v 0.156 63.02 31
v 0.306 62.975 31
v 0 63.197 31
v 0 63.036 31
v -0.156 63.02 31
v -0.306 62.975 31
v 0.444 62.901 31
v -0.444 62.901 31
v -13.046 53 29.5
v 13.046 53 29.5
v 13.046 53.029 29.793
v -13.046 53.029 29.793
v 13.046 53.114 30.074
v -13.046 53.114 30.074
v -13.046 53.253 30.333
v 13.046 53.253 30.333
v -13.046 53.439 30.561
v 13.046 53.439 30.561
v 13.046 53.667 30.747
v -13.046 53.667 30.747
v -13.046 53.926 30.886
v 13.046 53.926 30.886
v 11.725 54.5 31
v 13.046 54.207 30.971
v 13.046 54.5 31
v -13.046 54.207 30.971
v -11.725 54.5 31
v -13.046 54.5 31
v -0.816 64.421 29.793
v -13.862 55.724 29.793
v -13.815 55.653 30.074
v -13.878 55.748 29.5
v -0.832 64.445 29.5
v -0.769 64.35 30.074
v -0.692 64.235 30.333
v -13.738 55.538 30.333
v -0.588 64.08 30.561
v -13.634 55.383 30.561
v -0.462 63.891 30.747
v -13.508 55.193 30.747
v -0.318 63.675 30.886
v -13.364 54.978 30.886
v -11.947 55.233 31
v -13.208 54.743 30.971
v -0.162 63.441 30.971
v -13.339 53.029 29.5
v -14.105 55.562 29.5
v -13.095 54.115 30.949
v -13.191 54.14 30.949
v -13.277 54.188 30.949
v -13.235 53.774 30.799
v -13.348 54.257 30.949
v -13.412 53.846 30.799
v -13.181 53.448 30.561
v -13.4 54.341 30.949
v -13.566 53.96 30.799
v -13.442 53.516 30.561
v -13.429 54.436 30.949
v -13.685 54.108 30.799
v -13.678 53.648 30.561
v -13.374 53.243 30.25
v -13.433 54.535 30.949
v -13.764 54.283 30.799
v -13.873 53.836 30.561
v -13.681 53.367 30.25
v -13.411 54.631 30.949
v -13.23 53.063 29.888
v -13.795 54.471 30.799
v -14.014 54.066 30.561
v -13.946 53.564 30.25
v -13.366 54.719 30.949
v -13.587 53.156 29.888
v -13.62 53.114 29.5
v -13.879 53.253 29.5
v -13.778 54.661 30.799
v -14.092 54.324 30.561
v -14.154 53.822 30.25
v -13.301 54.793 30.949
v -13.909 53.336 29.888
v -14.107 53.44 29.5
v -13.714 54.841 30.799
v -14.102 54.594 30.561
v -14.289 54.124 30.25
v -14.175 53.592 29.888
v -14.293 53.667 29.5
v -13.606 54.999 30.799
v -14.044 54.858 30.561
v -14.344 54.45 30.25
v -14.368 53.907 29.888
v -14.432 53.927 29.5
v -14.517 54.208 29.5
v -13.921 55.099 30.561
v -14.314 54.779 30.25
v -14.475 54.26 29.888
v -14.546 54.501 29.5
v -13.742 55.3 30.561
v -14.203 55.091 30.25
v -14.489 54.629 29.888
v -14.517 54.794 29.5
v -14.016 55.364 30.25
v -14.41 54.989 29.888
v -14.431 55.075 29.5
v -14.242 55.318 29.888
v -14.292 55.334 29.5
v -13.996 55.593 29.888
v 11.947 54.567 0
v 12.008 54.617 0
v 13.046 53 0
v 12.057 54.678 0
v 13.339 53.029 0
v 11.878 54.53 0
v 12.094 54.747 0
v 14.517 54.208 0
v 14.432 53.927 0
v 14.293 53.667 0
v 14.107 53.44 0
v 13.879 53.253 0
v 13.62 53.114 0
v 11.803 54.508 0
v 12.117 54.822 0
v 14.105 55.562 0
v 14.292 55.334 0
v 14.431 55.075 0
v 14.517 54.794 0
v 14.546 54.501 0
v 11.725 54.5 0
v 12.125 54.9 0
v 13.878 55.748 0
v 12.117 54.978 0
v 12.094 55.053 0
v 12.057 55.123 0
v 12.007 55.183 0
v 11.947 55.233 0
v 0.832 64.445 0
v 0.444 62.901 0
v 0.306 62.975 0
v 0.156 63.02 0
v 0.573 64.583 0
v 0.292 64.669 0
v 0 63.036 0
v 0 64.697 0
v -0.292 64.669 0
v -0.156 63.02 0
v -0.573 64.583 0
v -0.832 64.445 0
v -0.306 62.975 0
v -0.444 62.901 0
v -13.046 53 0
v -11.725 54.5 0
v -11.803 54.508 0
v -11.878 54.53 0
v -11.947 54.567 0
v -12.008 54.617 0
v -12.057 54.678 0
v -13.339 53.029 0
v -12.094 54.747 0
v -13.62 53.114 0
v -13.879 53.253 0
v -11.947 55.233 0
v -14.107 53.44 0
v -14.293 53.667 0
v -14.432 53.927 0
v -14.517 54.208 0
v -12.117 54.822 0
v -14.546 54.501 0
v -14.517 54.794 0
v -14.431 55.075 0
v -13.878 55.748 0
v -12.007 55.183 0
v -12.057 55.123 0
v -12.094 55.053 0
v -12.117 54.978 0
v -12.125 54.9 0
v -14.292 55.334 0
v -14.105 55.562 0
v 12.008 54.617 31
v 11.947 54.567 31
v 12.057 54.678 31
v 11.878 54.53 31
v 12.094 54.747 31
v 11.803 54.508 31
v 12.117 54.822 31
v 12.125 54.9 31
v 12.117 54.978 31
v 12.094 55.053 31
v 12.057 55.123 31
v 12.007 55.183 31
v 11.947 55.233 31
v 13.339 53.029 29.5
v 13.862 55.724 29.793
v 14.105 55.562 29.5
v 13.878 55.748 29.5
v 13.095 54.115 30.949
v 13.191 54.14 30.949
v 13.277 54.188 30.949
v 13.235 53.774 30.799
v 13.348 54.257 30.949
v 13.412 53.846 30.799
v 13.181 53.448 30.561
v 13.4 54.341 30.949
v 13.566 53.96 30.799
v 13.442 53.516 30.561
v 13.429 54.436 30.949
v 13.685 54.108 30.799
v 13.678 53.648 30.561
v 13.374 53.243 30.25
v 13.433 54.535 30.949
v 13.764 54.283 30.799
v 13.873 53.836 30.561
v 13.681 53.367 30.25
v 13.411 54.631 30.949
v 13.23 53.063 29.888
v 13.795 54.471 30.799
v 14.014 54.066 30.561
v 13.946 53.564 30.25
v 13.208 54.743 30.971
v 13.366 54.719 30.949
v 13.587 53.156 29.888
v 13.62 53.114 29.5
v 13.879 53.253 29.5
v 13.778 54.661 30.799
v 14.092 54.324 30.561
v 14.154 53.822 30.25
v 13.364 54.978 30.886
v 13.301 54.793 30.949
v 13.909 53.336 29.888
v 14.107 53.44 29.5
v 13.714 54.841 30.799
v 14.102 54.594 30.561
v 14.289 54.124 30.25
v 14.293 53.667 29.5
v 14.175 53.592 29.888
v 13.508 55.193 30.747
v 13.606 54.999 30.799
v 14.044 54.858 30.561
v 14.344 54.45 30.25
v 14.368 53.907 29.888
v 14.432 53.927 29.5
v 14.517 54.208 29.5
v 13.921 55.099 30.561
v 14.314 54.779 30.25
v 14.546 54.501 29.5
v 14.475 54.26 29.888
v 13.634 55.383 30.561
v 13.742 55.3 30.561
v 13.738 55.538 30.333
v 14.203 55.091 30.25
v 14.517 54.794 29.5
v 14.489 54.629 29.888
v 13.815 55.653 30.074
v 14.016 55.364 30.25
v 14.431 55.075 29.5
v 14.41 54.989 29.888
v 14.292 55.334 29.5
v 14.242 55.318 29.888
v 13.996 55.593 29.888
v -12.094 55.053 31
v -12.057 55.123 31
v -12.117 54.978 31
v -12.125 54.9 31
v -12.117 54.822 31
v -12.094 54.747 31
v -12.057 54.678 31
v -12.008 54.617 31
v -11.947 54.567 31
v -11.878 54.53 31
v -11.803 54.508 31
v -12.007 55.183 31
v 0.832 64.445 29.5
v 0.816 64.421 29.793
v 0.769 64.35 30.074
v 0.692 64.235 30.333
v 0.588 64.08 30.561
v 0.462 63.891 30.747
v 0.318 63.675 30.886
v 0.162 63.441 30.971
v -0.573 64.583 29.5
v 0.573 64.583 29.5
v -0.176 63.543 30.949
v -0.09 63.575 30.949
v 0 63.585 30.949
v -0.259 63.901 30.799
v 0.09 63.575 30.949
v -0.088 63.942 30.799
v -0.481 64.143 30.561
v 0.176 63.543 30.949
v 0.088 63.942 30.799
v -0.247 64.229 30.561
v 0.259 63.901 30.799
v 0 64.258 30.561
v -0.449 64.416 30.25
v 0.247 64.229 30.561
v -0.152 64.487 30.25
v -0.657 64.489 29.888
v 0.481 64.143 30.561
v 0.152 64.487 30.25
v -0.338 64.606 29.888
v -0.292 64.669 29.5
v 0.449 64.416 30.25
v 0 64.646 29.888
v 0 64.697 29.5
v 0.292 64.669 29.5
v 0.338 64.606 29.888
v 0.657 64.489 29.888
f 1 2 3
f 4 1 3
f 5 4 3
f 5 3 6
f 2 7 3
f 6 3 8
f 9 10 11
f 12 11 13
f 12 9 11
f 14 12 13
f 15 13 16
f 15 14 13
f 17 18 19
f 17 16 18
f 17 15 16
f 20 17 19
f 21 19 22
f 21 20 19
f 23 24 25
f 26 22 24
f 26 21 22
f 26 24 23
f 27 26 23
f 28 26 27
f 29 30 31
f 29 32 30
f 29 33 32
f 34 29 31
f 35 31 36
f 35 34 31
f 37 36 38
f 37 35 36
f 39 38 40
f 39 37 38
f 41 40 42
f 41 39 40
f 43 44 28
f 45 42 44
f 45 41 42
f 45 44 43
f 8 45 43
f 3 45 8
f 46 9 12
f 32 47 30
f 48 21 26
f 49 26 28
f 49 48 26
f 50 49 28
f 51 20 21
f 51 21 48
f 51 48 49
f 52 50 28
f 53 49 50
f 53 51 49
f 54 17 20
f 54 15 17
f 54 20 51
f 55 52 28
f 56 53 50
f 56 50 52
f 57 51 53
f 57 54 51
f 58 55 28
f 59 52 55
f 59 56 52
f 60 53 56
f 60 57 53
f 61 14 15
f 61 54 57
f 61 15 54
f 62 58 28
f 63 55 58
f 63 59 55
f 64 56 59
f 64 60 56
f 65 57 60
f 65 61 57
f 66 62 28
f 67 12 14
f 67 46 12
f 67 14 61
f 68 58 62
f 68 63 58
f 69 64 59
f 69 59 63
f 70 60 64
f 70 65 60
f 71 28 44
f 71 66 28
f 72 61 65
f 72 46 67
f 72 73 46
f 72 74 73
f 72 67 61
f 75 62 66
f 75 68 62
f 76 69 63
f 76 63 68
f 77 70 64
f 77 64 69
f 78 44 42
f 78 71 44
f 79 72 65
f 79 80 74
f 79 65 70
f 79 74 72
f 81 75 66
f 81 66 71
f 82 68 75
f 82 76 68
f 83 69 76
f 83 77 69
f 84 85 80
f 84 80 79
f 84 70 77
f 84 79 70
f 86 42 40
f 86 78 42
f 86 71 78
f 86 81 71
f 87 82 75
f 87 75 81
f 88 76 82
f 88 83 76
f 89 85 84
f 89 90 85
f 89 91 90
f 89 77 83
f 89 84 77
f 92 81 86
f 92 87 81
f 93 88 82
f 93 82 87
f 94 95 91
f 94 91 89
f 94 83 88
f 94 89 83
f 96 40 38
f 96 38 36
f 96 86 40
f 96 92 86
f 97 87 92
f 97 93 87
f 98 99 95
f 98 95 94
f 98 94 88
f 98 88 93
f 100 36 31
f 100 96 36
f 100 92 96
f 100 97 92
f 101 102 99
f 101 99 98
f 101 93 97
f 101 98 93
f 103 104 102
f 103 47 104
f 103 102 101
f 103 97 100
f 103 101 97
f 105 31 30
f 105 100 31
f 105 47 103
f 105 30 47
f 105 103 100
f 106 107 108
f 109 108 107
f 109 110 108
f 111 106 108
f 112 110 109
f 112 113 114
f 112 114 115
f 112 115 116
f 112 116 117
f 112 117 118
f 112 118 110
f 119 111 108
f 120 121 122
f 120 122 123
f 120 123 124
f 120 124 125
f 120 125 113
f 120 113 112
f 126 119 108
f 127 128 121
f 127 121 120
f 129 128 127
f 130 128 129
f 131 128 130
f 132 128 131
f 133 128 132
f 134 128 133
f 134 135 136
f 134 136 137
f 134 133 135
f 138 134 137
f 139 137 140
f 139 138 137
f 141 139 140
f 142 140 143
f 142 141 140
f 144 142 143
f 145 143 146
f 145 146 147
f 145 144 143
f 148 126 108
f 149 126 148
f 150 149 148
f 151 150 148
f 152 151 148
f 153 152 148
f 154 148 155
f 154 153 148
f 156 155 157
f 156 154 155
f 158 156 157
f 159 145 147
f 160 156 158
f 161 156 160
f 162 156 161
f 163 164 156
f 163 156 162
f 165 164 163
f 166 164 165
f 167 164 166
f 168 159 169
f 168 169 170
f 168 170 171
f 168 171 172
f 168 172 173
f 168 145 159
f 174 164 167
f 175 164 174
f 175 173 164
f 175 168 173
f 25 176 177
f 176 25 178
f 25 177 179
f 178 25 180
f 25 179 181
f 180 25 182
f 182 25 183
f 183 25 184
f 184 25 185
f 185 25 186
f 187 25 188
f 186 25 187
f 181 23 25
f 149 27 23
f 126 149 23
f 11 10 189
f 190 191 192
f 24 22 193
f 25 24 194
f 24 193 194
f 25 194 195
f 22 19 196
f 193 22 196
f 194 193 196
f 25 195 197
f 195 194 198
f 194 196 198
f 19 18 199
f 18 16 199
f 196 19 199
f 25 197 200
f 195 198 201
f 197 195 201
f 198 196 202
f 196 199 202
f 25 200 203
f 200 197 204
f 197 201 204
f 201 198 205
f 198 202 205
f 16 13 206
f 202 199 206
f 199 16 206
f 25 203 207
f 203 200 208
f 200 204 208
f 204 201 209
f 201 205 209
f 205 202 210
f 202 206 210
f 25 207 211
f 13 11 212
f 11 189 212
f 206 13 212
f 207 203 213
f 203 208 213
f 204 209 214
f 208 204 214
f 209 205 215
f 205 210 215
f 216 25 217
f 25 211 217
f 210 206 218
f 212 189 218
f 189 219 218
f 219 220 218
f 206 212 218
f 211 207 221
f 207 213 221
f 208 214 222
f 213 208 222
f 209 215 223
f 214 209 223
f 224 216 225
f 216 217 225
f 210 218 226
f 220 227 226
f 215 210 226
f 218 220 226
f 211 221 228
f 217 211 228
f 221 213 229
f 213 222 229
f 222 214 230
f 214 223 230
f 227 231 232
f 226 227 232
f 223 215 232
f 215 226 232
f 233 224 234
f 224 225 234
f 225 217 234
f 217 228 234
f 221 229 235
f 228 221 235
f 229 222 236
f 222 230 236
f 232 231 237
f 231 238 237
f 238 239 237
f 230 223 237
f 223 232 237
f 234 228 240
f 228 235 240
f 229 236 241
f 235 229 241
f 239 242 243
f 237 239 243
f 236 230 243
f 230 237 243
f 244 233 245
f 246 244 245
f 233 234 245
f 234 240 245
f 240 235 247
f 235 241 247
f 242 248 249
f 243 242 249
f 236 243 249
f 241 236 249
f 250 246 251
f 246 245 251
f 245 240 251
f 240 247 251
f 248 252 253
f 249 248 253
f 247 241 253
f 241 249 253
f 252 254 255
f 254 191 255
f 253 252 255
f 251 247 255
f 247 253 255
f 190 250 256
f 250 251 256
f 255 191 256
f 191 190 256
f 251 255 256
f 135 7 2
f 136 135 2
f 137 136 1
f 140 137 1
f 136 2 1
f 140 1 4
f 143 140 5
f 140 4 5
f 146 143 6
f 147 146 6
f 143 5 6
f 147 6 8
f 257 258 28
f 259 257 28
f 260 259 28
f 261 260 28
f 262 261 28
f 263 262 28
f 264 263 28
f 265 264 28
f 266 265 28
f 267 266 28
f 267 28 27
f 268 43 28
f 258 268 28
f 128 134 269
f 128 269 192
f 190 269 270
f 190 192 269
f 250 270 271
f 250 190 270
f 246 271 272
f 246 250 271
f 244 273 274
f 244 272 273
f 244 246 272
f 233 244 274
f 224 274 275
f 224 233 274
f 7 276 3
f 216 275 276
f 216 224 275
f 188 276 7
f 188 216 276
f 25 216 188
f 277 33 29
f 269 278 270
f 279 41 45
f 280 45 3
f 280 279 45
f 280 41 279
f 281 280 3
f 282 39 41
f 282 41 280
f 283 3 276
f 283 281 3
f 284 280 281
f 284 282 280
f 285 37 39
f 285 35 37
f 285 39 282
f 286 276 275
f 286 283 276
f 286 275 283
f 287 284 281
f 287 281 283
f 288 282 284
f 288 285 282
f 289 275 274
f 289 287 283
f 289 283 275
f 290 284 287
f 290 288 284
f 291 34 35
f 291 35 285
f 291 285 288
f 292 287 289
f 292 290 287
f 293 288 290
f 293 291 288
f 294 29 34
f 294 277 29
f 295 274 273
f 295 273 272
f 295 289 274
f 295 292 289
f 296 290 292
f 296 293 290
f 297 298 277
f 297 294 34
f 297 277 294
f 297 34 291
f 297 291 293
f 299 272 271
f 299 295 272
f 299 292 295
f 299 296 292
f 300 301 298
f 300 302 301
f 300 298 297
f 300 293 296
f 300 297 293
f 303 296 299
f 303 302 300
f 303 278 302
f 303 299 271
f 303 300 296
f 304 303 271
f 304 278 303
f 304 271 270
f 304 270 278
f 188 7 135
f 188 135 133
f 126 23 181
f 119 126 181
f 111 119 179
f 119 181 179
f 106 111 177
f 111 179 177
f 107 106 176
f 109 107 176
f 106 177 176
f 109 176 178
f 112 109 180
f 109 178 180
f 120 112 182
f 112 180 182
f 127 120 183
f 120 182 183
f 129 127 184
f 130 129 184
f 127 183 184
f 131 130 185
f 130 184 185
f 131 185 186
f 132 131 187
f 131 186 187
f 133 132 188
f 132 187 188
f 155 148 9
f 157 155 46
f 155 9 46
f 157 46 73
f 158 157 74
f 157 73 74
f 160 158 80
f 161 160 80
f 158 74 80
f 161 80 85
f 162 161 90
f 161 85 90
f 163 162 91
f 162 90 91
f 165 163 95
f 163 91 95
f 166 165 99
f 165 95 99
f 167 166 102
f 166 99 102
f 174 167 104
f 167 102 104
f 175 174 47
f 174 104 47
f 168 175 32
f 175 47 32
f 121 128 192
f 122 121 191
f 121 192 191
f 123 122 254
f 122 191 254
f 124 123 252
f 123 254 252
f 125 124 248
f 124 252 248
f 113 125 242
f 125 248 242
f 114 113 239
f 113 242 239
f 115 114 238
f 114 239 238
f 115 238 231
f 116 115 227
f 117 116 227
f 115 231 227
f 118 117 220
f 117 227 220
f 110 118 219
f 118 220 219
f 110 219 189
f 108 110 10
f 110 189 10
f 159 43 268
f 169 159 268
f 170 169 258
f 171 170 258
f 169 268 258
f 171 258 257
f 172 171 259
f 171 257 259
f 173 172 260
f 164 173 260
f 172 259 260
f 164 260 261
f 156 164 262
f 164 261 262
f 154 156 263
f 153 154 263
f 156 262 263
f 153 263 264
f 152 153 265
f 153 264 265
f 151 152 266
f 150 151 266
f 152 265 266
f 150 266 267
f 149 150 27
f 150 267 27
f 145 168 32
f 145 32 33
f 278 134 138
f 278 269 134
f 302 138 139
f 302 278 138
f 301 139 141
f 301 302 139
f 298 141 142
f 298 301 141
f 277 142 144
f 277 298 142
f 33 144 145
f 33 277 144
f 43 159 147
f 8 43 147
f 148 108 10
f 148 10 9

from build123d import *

# Parameters (mm, degrees)
PAD010_DEPTH = 31
FILLET004_R  = 1.5
POCKET_DEPTH = 32


with BuildPart() as part:
    # Sketch002 → Pad010 (new body)
    with BuildSketch(Plane.XY):
        Polygon((0, 65), (18, 53), (-18, 53), align=None)
    extrude(amount=PAD010_DEPTH)

    # Fillet004
    fillet004_edges = [part.edges().sort_by_distance(p)[0] for p in [
        (-18, 53, 15.5),
        (18, 53, 15.5),
        (0, 65, 15.5),
        (0, 53, 31),
        (-9, 59, 31),
        (9, 59, 31),
    ]]
    fillet(fillet004_edges, radius=FILLET004_R)

    # Sketch004 (on Face11 of Fillet004) → Pocket (cut)
    with BuildSketch(Plane.XY.offset(31)):
        with BuildLine():
            Line((-11.9466006322, 55.2328239407), (-0.4437599322, 62.9013844075))
            ThreePointArc((0.4437600752, 62.9013843122), (8.59e-08, 63.0357440221), (-0.4437599322, 62.9013844075))
            Line((0.4437600752, 62.9013843122), (11.9466006329, 55.2328239403))
            ThreePointArc((11.724725846, 54.5), (12.1075640333, 54.7840894266), (11.9466006329, 55.2328239403))
            Line((-11.7247263937, 54.5), (11.724725846, 54.5))
            ThreePointArc((-11.9466006322, 55.2328239407), (-12.1075641128, 54.7840896892), (-11.7247263937, 54.5))
        make_face()
    extrude(amount=-POCKET_DEPTH, mode=Mode.SUBTRACT)


solid = part.part
